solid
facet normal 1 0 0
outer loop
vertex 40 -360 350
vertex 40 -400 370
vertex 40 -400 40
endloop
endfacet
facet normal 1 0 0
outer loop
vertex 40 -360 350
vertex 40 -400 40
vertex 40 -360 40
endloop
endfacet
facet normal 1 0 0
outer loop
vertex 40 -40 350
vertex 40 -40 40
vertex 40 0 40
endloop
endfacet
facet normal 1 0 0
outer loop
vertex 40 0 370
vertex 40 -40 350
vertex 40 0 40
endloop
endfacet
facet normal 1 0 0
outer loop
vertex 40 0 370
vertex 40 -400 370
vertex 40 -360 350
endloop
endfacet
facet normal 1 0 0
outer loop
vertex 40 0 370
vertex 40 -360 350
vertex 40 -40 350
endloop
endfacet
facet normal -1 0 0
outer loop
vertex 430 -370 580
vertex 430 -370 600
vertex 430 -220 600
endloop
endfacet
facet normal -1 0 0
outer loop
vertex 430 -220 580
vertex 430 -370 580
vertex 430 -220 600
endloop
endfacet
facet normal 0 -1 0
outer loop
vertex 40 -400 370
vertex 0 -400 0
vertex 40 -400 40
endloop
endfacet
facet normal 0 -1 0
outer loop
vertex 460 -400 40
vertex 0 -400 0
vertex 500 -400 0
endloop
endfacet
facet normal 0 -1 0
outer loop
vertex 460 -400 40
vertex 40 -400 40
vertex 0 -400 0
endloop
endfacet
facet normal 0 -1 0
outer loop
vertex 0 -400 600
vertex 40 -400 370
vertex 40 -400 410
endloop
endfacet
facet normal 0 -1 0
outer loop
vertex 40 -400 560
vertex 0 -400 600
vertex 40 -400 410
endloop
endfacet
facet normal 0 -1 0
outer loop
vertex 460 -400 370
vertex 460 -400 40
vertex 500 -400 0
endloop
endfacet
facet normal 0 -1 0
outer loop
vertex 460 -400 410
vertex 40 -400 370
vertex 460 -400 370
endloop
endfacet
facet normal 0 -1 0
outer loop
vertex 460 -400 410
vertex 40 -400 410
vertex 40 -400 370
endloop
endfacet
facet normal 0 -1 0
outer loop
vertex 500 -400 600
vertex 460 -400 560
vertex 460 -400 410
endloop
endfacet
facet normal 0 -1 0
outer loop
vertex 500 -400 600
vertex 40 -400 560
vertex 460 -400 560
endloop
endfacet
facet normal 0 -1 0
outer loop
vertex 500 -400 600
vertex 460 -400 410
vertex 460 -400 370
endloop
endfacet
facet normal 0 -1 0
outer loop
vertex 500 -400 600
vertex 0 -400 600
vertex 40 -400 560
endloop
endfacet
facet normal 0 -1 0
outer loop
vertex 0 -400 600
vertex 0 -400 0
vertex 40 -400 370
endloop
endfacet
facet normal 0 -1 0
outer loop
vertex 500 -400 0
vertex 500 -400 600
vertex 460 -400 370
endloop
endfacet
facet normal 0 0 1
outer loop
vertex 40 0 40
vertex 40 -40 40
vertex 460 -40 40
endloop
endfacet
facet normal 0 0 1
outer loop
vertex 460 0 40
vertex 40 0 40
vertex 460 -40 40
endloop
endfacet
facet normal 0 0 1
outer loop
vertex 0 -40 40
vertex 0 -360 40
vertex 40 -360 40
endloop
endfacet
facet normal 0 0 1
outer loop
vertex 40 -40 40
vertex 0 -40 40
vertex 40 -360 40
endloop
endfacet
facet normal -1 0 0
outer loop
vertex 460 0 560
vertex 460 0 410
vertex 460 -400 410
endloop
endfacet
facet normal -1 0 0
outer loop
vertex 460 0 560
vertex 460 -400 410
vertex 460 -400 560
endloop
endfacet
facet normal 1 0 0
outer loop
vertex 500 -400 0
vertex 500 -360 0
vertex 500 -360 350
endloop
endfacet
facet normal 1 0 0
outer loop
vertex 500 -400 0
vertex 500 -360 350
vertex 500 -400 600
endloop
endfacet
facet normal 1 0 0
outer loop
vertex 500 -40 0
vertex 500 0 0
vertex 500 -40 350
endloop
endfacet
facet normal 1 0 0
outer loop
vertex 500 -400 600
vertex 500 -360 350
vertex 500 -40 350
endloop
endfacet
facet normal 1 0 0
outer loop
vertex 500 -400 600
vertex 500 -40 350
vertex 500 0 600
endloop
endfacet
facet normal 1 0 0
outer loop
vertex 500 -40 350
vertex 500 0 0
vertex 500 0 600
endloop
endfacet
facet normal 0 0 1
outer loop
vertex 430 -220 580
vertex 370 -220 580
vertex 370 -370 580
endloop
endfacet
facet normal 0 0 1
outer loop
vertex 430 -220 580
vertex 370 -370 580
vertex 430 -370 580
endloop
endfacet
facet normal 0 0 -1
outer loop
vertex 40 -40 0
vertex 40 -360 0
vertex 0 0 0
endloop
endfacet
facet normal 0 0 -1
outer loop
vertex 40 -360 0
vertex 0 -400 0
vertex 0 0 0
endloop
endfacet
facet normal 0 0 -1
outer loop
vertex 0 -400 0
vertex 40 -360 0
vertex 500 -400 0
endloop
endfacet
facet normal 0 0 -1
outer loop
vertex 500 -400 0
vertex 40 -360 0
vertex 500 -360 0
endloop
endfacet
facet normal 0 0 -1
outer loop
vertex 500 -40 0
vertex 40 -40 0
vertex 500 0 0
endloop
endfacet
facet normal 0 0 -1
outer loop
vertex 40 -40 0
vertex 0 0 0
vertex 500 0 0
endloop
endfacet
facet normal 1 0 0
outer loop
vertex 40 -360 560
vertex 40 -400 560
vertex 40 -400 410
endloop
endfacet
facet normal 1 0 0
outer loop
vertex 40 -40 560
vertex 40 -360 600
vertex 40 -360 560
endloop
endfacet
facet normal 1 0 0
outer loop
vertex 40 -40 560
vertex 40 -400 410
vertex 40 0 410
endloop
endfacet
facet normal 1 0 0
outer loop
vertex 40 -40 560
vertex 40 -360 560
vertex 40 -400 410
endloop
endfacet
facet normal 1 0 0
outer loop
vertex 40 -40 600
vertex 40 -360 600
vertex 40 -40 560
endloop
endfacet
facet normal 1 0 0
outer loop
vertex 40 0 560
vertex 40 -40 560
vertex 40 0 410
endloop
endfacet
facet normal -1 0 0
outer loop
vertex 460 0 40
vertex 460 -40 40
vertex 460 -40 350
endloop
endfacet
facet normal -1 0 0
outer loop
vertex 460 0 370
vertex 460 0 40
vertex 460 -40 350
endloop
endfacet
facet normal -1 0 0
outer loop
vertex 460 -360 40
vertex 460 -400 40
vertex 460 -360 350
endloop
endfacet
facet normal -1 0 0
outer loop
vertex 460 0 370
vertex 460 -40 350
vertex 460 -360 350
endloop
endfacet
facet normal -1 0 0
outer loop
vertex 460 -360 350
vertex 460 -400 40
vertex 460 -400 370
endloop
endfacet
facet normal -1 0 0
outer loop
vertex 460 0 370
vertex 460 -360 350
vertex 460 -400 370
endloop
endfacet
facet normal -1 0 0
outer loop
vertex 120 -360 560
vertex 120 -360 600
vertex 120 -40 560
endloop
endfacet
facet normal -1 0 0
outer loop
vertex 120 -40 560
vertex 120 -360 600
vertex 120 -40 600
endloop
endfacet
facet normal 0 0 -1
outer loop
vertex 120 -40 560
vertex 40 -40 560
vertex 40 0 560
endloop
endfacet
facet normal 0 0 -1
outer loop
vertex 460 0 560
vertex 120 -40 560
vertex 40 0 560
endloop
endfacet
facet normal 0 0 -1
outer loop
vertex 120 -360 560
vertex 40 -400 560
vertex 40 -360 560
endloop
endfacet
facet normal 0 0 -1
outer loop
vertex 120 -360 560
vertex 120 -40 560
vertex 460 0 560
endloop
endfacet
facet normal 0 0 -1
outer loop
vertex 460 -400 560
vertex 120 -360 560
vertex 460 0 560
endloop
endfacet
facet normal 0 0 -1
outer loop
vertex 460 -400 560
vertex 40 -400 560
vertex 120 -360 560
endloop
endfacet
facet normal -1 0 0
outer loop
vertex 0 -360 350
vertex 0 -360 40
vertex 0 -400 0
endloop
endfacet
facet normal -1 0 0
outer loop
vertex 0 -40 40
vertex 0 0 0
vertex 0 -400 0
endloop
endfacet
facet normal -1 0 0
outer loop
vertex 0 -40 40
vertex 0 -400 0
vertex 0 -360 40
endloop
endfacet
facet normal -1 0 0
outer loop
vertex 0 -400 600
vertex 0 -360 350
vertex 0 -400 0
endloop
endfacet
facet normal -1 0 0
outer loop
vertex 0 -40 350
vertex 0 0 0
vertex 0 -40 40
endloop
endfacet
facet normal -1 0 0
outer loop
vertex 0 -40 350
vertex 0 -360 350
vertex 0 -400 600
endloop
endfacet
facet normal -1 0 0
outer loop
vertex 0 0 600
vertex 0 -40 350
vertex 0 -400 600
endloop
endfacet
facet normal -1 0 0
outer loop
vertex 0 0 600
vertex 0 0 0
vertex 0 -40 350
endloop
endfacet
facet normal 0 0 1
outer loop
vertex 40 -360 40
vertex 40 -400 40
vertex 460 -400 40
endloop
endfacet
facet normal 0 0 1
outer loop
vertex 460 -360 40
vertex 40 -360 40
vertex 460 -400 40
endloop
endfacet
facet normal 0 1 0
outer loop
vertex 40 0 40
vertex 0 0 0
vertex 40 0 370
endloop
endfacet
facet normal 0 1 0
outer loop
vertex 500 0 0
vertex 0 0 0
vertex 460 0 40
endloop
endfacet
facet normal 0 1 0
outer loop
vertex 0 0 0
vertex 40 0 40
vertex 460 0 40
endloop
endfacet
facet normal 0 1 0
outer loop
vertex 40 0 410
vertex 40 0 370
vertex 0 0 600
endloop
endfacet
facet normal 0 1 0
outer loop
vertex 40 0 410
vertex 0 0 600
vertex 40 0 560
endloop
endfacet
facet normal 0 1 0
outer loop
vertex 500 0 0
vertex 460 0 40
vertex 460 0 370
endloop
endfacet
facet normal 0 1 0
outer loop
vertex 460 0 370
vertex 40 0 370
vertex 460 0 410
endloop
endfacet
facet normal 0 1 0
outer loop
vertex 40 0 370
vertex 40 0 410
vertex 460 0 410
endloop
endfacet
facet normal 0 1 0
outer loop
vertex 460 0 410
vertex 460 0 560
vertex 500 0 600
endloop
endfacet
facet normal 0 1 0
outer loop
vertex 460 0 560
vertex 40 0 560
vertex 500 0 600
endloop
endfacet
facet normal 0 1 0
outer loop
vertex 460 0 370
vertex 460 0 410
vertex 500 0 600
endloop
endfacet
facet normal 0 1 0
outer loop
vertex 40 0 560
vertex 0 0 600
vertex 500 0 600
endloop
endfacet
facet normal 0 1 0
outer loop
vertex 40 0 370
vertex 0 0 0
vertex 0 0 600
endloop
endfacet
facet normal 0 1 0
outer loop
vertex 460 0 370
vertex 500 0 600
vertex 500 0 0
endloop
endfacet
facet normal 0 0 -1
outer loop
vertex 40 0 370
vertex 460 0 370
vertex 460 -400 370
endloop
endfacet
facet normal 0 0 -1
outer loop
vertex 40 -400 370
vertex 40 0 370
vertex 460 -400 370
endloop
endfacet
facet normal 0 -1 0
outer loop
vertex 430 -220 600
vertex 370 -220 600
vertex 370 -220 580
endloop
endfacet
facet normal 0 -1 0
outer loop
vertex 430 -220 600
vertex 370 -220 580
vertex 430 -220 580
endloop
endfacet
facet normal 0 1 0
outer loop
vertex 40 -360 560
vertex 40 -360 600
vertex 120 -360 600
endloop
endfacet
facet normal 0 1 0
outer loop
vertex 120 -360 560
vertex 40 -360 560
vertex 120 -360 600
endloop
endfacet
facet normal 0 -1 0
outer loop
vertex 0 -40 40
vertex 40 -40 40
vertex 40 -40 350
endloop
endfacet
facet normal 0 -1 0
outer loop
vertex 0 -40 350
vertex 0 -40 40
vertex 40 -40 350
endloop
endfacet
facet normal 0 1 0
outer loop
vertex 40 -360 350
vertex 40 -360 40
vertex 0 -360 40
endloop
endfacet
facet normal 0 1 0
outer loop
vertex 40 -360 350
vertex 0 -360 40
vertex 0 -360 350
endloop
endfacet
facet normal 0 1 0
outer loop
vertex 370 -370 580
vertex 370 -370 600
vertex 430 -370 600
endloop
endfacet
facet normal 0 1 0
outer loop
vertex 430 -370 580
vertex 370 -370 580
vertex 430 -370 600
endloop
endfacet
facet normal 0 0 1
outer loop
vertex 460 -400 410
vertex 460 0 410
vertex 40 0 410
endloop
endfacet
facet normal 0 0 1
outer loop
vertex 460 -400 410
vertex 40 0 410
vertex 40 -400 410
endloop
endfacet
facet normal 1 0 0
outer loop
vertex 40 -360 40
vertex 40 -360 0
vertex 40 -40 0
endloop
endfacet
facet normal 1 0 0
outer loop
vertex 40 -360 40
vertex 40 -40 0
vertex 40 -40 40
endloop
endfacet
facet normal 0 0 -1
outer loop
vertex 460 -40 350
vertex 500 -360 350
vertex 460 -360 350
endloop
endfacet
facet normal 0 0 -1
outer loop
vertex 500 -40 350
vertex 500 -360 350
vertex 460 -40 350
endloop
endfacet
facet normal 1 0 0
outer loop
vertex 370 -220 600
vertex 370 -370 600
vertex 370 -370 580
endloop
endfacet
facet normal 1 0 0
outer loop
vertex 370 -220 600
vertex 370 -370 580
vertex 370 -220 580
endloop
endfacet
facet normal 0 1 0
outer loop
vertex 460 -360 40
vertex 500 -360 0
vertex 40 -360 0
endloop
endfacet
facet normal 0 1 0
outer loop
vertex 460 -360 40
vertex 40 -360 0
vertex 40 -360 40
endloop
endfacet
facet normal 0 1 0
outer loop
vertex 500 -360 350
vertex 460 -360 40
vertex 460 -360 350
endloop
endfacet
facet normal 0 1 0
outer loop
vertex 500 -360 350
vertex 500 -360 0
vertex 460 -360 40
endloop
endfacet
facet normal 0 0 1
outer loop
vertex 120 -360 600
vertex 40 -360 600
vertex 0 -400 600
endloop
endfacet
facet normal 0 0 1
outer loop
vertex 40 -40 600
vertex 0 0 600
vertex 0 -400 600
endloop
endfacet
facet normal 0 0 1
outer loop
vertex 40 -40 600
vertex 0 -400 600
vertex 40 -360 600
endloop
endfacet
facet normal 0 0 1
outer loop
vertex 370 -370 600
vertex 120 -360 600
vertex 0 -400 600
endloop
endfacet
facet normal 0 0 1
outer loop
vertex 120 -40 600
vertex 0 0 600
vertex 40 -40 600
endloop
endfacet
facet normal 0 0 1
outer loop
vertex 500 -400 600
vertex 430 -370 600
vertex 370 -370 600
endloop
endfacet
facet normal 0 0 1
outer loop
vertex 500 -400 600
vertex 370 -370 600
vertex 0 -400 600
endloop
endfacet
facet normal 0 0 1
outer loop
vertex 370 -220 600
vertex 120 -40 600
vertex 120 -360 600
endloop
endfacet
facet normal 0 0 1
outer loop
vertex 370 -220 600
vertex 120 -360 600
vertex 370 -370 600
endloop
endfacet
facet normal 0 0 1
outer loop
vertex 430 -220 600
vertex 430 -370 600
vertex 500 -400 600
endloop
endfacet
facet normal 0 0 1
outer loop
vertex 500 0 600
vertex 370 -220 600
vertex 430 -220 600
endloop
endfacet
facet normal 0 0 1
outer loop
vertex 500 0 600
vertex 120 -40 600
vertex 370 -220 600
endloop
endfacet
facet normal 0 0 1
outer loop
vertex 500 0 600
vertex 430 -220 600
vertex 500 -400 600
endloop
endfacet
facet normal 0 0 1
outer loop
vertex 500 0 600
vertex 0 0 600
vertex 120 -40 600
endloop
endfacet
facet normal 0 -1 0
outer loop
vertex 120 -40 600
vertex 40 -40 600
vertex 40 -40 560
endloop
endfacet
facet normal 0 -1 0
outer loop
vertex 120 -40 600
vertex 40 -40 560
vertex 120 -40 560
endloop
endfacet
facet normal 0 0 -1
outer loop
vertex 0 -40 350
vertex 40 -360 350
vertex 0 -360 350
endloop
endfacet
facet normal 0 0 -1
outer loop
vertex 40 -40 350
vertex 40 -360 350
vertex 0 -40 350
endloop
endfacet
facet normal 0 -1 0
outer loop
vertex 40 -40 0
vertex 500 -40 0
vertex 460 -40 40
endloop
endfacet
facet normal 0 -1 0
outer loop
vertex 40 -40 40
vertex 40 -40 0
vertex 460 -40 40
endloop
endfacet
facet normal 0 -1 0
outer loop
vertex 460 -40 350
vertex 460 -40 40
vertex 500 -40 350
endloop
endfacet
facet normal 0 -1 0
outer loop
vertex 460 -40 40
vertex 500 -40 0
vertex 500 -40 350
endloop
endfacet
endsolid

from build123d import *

# Parameters (mm, degrees)
F0_W      = 500
F0_H      = 600
F1_DEPTH  = 400
F3_W      = 80
F3_H      = 320
F4_DEPTH  = 200
F5_W      = 420
F5_H      = 520
F6_DEPTH  = 400
F7_W      = 400
F7_H      = 40
F8_DEPTH  = 420
F9_W      = 60
F9_H      = 150
F10_DEPTH = 20
F11_W     = 320
F11_H     = 350
F12_DEPTH = 625
F13_W     = 40
F13_H     = 40
F14_DEPTH = 325


with BuildPart() as f1:
    # F0 (on Front) → F1 (new body)
    with BuildSketch(Plane.XZ):
        with Locations((250, 300)):
            Rectangle(F0_W, F0_H)
    extrude(amount=F1_DEPTH)

    # F3 (on face) → F4 (cut)
    with BuildSketch(Plane.XY.offset(600)):
        with Locations((80, -200)):
            Rectangle(F3_W, F3_H)
    extrude(amount=-F4_DEPTH, mode=Mode.SUBTRACT)

    # F5 (on face) → F6 (cut)
    with BuildSketch(Plane.XZ.offset(400)):
        with Locations((250, 300)):
            Rectangle(F5_W, F5_H)
    extrude(amount=-F6_DEPTH, mode=Mode.SUBTRACT)

    # F7 (on face) → F8 (join)
    with BuildSketch(Plane(origin=(460, 0, 0), x_dir=(0, -1, 0), z_dir=(-1, 0, 0))):
        with Locations((200, 390)):
            Rectangle(F7_W, F7_H)
    extrude(amount=F8_DEPTH)

    # F9 (on face) → F10 (cut)
    with BuildSketch(Plane.XY.offset(600)):
        with Locations((400, -295)):
            Rectangle(F9_W, F9_H)
    extrude(amount=-F10_DEPTH, mode=Mode.SUBTRACT)

    # F11 (on face) → F12 (cut)
    with BuildSketch(Plane.YZ.offset(500)):
        with Locations((-200, 175)):
            Rectangle(F11_W, F11_H)
    extrude(amount=-F12_DEPTH, mode=Mode.SUBTRACT)

    # F13 (on face) → F14 (join)
    with BuildSketch(Plane.XZ.offset(40)):
        with Locations((20, 20)):
            Rectangle(F13_W, F13_H)
    extrude(amount=F14_DEPTH)


solid = f1.part
